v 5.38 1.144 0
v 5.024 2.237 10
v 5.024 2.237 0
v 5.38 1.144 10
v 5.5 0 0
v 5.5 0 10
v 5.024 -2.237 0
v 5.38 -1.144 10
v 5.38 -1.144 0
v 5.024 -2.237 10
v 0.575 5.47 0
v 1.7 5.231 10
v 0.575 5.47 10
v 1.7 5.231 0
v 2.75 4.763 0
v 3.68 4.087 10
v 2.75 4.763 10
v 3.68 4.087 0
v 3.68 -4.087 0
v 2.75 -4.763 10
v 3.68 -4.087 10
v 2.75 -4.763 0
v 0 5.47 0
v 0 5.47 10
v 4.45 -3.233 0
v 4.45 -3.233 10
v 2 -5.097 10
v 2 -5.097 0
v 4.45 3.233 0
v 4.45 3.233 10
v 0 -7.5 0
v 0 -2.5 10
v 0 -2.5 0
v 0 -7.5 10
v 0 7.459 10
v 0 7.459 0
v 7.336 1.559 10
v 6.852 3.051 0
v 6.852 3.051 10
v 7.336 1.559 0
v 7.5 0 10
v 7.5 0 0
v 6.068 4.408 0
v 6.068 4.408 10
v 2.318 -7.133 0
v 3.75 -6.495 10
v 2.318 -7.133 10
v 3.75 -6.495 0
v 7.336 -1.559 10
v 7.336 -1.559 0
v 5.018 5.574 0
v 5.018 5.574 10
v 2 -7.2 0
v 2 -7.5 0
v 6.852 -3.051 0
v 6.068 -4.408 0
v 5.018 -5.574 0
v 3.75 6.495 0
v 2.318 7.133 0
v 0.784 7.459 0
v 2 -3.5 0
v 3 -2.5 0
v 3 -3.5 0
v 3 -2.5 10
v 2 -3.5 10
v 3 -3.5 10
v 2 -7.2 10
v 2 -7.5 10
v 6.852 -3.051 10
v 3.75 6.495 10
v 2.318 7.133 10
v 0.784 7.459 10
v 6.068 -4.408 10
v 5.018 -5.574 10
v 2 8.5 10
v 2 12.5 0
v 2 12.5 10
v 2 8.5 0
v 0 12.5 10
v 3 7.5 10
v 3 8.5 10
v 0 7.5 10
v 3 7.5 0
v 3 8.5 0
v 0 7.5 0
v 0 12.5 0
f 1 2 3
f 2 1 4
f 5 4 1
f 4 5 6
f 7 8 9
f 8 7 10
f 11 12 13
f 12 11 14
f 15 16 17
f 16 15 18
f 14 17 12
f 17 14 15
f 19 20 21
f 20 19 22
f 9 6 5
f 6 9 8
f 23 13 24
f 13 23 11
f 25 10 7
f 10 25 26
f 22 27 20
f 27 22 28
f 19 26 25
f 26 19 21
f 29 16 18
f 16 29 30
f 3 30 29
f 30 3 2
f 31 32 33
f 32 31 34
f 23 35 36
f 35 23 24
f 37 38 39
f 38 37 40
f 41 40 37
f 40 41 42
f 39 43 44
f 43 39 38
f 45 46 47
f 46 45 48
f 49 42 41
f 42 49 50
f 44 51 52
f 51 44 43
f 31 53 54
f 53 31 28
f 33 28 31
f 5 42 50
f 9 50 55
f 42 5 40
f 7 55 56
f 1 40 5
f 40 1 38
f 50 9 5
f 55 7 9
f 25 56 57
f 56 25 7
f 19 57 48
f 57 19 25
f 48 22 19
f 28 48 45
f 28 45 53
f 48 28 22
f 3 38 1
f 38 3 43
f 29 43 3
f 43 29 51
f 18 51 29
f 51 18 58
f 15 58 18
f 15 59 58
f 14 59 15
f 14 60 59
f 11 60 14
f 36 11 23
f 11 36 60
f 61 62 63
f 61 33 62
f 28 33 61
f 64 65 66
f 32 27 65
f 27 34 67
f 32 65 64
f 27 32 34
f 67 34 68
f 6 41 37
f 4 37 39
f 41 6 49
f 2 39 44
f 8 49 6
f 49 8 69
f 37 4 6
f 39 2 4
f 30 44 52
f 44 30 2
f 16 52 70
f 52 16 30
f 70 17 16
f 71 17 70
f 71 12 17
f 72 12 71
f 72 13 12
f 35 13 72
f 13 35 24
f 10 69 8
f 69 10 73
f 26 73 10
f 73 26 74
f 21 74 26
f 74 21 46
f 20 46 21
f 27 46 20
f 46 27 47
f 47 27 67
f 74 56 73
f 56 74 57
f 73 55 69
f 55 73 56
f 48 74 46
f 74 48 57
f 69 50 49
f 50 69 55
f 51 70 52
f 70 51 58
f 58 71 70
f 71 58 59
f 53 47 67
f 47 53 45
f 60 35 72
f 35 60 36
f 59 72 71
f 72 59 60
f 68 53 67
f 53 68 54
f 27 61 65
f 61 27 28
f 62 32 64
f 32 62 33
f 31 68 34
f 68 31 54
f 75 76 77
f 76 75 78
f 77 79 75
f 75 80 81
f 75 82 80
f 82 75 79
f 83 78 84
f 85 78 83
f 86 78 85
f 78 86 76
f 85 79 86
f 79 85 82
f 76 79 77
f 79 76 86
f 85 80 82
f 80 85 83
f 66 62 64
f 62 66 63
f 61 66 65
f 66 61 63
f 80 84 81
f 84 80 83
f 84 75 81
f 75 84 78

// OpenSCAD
loop_diameter = 15;
hook_length = 5;
hook_thickness = 2;
lip_size = 1; // the side length of a rectangular prism on the end of the hook.
part_height = 10;
quality = 30;

difference()
{
    translate([0,0,0]) cylinder(part_height,loop_diameter/2,loop_diameter/2,$fn= quality);
    union()
    {
        translate([0,0,-1]) cylinder(part_height+2, loop_diameter/2-hook_thickness,loop_diameter/2-hook_thickness,$fn = quality);
        translate([-loop_diameter/2,0,part_height/2]) cube([loop_diameter,loop_diameter,part_height+2],center = true);
    };
};

translate([0,-loop_diameter/2,0]) cube([hook_thickness,hook_length,part_height]);
translate([0,loop_diameter/2,0]) cube([hook_thickness,hook_length,part_height]);
translate([hook_thickness,-loop_diameter/2+hook_length-lip_size,0]) cube([lip_size,lip_size,part_height]);
translate([hook_thickness,loop_diameter/2,0]) cube([lip_size,lip_size,part_height]);
